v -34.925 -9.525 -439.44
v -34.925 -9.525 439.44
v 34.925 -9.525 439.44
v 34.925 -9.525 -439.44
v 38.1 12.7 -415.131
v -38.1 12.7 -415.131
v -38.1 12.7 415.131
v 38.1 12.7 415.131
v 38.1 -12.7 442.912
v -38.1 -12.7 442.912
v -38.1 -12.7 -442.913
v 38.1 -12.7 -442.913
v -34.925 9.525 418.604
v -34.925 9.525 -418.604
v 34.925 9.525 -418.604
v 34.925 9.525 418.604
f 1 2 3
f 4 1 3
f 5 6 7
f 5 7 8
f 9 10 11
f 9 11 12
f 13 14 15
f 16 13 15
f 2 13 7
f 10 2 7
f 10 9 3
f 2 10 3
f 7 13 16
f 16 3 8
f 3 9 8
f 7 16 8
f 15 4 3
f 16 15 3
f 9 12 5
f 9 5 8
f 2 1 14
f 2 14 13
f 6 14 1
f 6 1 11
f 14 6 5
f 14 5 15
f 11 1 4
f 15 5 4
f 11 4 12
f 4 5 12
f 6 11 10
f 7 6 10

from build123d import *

# Parameters (mm, degrees)
SKETCH3_W           = 76.2
SKETCH3_H           = 25.4
SKETCH3_W_2         = 69.85
SKETCH3_H_2         = 19.05
BOSS_EXTRUDE1_DEPTH = 457.2
SKETCH4_W           = 14.2875
SKETCH4_H           = 25.4
CUT_EXTRUDE1_DEPTH  = 464.680461094


with BuildPart() as part:
    # Sketch3 → Boss-Extrude1 (new, symmetric)
    with BuildSketch(Plane.XY):
        Rectangle(SKETCH3_W, SKETCH3_H)
        Rectangle(SKETCH3_W_2, SKETCH3_H_2, mode=Mode.SUBTRACT)
    extrude(amount=BOSS_EXTRUDE1_DEPTH, both=True)

    # Sketch4 → Cut-Extrude1 (cut, through all)
    with BuildSketch(Plane(origin=(38.1, 0, 0), x_dir=(0, 0, -1), z_dir=(1, 0, 0))):
        with Locations((-450.05625, 0)):
            Rectangle(SKETCH4_W, SKETCH4_H)
        Polygon((-442.9125, -12.7), (-415.13125, 12.7), (-442.9125, 12.7), align=None)
        with Locations((450.05625, 0)):
            Rectangle(SKETCH4_W, SKETCH4_H)
        Polygon((442.9125, -12.7), (442.9125, 12.7), (415.13125, 12.7), align=None)
    extrude(amount=-CUT_EXTRUDE1_DEPTH, mode=Mode.SUBTRACT)


solid = part.part
